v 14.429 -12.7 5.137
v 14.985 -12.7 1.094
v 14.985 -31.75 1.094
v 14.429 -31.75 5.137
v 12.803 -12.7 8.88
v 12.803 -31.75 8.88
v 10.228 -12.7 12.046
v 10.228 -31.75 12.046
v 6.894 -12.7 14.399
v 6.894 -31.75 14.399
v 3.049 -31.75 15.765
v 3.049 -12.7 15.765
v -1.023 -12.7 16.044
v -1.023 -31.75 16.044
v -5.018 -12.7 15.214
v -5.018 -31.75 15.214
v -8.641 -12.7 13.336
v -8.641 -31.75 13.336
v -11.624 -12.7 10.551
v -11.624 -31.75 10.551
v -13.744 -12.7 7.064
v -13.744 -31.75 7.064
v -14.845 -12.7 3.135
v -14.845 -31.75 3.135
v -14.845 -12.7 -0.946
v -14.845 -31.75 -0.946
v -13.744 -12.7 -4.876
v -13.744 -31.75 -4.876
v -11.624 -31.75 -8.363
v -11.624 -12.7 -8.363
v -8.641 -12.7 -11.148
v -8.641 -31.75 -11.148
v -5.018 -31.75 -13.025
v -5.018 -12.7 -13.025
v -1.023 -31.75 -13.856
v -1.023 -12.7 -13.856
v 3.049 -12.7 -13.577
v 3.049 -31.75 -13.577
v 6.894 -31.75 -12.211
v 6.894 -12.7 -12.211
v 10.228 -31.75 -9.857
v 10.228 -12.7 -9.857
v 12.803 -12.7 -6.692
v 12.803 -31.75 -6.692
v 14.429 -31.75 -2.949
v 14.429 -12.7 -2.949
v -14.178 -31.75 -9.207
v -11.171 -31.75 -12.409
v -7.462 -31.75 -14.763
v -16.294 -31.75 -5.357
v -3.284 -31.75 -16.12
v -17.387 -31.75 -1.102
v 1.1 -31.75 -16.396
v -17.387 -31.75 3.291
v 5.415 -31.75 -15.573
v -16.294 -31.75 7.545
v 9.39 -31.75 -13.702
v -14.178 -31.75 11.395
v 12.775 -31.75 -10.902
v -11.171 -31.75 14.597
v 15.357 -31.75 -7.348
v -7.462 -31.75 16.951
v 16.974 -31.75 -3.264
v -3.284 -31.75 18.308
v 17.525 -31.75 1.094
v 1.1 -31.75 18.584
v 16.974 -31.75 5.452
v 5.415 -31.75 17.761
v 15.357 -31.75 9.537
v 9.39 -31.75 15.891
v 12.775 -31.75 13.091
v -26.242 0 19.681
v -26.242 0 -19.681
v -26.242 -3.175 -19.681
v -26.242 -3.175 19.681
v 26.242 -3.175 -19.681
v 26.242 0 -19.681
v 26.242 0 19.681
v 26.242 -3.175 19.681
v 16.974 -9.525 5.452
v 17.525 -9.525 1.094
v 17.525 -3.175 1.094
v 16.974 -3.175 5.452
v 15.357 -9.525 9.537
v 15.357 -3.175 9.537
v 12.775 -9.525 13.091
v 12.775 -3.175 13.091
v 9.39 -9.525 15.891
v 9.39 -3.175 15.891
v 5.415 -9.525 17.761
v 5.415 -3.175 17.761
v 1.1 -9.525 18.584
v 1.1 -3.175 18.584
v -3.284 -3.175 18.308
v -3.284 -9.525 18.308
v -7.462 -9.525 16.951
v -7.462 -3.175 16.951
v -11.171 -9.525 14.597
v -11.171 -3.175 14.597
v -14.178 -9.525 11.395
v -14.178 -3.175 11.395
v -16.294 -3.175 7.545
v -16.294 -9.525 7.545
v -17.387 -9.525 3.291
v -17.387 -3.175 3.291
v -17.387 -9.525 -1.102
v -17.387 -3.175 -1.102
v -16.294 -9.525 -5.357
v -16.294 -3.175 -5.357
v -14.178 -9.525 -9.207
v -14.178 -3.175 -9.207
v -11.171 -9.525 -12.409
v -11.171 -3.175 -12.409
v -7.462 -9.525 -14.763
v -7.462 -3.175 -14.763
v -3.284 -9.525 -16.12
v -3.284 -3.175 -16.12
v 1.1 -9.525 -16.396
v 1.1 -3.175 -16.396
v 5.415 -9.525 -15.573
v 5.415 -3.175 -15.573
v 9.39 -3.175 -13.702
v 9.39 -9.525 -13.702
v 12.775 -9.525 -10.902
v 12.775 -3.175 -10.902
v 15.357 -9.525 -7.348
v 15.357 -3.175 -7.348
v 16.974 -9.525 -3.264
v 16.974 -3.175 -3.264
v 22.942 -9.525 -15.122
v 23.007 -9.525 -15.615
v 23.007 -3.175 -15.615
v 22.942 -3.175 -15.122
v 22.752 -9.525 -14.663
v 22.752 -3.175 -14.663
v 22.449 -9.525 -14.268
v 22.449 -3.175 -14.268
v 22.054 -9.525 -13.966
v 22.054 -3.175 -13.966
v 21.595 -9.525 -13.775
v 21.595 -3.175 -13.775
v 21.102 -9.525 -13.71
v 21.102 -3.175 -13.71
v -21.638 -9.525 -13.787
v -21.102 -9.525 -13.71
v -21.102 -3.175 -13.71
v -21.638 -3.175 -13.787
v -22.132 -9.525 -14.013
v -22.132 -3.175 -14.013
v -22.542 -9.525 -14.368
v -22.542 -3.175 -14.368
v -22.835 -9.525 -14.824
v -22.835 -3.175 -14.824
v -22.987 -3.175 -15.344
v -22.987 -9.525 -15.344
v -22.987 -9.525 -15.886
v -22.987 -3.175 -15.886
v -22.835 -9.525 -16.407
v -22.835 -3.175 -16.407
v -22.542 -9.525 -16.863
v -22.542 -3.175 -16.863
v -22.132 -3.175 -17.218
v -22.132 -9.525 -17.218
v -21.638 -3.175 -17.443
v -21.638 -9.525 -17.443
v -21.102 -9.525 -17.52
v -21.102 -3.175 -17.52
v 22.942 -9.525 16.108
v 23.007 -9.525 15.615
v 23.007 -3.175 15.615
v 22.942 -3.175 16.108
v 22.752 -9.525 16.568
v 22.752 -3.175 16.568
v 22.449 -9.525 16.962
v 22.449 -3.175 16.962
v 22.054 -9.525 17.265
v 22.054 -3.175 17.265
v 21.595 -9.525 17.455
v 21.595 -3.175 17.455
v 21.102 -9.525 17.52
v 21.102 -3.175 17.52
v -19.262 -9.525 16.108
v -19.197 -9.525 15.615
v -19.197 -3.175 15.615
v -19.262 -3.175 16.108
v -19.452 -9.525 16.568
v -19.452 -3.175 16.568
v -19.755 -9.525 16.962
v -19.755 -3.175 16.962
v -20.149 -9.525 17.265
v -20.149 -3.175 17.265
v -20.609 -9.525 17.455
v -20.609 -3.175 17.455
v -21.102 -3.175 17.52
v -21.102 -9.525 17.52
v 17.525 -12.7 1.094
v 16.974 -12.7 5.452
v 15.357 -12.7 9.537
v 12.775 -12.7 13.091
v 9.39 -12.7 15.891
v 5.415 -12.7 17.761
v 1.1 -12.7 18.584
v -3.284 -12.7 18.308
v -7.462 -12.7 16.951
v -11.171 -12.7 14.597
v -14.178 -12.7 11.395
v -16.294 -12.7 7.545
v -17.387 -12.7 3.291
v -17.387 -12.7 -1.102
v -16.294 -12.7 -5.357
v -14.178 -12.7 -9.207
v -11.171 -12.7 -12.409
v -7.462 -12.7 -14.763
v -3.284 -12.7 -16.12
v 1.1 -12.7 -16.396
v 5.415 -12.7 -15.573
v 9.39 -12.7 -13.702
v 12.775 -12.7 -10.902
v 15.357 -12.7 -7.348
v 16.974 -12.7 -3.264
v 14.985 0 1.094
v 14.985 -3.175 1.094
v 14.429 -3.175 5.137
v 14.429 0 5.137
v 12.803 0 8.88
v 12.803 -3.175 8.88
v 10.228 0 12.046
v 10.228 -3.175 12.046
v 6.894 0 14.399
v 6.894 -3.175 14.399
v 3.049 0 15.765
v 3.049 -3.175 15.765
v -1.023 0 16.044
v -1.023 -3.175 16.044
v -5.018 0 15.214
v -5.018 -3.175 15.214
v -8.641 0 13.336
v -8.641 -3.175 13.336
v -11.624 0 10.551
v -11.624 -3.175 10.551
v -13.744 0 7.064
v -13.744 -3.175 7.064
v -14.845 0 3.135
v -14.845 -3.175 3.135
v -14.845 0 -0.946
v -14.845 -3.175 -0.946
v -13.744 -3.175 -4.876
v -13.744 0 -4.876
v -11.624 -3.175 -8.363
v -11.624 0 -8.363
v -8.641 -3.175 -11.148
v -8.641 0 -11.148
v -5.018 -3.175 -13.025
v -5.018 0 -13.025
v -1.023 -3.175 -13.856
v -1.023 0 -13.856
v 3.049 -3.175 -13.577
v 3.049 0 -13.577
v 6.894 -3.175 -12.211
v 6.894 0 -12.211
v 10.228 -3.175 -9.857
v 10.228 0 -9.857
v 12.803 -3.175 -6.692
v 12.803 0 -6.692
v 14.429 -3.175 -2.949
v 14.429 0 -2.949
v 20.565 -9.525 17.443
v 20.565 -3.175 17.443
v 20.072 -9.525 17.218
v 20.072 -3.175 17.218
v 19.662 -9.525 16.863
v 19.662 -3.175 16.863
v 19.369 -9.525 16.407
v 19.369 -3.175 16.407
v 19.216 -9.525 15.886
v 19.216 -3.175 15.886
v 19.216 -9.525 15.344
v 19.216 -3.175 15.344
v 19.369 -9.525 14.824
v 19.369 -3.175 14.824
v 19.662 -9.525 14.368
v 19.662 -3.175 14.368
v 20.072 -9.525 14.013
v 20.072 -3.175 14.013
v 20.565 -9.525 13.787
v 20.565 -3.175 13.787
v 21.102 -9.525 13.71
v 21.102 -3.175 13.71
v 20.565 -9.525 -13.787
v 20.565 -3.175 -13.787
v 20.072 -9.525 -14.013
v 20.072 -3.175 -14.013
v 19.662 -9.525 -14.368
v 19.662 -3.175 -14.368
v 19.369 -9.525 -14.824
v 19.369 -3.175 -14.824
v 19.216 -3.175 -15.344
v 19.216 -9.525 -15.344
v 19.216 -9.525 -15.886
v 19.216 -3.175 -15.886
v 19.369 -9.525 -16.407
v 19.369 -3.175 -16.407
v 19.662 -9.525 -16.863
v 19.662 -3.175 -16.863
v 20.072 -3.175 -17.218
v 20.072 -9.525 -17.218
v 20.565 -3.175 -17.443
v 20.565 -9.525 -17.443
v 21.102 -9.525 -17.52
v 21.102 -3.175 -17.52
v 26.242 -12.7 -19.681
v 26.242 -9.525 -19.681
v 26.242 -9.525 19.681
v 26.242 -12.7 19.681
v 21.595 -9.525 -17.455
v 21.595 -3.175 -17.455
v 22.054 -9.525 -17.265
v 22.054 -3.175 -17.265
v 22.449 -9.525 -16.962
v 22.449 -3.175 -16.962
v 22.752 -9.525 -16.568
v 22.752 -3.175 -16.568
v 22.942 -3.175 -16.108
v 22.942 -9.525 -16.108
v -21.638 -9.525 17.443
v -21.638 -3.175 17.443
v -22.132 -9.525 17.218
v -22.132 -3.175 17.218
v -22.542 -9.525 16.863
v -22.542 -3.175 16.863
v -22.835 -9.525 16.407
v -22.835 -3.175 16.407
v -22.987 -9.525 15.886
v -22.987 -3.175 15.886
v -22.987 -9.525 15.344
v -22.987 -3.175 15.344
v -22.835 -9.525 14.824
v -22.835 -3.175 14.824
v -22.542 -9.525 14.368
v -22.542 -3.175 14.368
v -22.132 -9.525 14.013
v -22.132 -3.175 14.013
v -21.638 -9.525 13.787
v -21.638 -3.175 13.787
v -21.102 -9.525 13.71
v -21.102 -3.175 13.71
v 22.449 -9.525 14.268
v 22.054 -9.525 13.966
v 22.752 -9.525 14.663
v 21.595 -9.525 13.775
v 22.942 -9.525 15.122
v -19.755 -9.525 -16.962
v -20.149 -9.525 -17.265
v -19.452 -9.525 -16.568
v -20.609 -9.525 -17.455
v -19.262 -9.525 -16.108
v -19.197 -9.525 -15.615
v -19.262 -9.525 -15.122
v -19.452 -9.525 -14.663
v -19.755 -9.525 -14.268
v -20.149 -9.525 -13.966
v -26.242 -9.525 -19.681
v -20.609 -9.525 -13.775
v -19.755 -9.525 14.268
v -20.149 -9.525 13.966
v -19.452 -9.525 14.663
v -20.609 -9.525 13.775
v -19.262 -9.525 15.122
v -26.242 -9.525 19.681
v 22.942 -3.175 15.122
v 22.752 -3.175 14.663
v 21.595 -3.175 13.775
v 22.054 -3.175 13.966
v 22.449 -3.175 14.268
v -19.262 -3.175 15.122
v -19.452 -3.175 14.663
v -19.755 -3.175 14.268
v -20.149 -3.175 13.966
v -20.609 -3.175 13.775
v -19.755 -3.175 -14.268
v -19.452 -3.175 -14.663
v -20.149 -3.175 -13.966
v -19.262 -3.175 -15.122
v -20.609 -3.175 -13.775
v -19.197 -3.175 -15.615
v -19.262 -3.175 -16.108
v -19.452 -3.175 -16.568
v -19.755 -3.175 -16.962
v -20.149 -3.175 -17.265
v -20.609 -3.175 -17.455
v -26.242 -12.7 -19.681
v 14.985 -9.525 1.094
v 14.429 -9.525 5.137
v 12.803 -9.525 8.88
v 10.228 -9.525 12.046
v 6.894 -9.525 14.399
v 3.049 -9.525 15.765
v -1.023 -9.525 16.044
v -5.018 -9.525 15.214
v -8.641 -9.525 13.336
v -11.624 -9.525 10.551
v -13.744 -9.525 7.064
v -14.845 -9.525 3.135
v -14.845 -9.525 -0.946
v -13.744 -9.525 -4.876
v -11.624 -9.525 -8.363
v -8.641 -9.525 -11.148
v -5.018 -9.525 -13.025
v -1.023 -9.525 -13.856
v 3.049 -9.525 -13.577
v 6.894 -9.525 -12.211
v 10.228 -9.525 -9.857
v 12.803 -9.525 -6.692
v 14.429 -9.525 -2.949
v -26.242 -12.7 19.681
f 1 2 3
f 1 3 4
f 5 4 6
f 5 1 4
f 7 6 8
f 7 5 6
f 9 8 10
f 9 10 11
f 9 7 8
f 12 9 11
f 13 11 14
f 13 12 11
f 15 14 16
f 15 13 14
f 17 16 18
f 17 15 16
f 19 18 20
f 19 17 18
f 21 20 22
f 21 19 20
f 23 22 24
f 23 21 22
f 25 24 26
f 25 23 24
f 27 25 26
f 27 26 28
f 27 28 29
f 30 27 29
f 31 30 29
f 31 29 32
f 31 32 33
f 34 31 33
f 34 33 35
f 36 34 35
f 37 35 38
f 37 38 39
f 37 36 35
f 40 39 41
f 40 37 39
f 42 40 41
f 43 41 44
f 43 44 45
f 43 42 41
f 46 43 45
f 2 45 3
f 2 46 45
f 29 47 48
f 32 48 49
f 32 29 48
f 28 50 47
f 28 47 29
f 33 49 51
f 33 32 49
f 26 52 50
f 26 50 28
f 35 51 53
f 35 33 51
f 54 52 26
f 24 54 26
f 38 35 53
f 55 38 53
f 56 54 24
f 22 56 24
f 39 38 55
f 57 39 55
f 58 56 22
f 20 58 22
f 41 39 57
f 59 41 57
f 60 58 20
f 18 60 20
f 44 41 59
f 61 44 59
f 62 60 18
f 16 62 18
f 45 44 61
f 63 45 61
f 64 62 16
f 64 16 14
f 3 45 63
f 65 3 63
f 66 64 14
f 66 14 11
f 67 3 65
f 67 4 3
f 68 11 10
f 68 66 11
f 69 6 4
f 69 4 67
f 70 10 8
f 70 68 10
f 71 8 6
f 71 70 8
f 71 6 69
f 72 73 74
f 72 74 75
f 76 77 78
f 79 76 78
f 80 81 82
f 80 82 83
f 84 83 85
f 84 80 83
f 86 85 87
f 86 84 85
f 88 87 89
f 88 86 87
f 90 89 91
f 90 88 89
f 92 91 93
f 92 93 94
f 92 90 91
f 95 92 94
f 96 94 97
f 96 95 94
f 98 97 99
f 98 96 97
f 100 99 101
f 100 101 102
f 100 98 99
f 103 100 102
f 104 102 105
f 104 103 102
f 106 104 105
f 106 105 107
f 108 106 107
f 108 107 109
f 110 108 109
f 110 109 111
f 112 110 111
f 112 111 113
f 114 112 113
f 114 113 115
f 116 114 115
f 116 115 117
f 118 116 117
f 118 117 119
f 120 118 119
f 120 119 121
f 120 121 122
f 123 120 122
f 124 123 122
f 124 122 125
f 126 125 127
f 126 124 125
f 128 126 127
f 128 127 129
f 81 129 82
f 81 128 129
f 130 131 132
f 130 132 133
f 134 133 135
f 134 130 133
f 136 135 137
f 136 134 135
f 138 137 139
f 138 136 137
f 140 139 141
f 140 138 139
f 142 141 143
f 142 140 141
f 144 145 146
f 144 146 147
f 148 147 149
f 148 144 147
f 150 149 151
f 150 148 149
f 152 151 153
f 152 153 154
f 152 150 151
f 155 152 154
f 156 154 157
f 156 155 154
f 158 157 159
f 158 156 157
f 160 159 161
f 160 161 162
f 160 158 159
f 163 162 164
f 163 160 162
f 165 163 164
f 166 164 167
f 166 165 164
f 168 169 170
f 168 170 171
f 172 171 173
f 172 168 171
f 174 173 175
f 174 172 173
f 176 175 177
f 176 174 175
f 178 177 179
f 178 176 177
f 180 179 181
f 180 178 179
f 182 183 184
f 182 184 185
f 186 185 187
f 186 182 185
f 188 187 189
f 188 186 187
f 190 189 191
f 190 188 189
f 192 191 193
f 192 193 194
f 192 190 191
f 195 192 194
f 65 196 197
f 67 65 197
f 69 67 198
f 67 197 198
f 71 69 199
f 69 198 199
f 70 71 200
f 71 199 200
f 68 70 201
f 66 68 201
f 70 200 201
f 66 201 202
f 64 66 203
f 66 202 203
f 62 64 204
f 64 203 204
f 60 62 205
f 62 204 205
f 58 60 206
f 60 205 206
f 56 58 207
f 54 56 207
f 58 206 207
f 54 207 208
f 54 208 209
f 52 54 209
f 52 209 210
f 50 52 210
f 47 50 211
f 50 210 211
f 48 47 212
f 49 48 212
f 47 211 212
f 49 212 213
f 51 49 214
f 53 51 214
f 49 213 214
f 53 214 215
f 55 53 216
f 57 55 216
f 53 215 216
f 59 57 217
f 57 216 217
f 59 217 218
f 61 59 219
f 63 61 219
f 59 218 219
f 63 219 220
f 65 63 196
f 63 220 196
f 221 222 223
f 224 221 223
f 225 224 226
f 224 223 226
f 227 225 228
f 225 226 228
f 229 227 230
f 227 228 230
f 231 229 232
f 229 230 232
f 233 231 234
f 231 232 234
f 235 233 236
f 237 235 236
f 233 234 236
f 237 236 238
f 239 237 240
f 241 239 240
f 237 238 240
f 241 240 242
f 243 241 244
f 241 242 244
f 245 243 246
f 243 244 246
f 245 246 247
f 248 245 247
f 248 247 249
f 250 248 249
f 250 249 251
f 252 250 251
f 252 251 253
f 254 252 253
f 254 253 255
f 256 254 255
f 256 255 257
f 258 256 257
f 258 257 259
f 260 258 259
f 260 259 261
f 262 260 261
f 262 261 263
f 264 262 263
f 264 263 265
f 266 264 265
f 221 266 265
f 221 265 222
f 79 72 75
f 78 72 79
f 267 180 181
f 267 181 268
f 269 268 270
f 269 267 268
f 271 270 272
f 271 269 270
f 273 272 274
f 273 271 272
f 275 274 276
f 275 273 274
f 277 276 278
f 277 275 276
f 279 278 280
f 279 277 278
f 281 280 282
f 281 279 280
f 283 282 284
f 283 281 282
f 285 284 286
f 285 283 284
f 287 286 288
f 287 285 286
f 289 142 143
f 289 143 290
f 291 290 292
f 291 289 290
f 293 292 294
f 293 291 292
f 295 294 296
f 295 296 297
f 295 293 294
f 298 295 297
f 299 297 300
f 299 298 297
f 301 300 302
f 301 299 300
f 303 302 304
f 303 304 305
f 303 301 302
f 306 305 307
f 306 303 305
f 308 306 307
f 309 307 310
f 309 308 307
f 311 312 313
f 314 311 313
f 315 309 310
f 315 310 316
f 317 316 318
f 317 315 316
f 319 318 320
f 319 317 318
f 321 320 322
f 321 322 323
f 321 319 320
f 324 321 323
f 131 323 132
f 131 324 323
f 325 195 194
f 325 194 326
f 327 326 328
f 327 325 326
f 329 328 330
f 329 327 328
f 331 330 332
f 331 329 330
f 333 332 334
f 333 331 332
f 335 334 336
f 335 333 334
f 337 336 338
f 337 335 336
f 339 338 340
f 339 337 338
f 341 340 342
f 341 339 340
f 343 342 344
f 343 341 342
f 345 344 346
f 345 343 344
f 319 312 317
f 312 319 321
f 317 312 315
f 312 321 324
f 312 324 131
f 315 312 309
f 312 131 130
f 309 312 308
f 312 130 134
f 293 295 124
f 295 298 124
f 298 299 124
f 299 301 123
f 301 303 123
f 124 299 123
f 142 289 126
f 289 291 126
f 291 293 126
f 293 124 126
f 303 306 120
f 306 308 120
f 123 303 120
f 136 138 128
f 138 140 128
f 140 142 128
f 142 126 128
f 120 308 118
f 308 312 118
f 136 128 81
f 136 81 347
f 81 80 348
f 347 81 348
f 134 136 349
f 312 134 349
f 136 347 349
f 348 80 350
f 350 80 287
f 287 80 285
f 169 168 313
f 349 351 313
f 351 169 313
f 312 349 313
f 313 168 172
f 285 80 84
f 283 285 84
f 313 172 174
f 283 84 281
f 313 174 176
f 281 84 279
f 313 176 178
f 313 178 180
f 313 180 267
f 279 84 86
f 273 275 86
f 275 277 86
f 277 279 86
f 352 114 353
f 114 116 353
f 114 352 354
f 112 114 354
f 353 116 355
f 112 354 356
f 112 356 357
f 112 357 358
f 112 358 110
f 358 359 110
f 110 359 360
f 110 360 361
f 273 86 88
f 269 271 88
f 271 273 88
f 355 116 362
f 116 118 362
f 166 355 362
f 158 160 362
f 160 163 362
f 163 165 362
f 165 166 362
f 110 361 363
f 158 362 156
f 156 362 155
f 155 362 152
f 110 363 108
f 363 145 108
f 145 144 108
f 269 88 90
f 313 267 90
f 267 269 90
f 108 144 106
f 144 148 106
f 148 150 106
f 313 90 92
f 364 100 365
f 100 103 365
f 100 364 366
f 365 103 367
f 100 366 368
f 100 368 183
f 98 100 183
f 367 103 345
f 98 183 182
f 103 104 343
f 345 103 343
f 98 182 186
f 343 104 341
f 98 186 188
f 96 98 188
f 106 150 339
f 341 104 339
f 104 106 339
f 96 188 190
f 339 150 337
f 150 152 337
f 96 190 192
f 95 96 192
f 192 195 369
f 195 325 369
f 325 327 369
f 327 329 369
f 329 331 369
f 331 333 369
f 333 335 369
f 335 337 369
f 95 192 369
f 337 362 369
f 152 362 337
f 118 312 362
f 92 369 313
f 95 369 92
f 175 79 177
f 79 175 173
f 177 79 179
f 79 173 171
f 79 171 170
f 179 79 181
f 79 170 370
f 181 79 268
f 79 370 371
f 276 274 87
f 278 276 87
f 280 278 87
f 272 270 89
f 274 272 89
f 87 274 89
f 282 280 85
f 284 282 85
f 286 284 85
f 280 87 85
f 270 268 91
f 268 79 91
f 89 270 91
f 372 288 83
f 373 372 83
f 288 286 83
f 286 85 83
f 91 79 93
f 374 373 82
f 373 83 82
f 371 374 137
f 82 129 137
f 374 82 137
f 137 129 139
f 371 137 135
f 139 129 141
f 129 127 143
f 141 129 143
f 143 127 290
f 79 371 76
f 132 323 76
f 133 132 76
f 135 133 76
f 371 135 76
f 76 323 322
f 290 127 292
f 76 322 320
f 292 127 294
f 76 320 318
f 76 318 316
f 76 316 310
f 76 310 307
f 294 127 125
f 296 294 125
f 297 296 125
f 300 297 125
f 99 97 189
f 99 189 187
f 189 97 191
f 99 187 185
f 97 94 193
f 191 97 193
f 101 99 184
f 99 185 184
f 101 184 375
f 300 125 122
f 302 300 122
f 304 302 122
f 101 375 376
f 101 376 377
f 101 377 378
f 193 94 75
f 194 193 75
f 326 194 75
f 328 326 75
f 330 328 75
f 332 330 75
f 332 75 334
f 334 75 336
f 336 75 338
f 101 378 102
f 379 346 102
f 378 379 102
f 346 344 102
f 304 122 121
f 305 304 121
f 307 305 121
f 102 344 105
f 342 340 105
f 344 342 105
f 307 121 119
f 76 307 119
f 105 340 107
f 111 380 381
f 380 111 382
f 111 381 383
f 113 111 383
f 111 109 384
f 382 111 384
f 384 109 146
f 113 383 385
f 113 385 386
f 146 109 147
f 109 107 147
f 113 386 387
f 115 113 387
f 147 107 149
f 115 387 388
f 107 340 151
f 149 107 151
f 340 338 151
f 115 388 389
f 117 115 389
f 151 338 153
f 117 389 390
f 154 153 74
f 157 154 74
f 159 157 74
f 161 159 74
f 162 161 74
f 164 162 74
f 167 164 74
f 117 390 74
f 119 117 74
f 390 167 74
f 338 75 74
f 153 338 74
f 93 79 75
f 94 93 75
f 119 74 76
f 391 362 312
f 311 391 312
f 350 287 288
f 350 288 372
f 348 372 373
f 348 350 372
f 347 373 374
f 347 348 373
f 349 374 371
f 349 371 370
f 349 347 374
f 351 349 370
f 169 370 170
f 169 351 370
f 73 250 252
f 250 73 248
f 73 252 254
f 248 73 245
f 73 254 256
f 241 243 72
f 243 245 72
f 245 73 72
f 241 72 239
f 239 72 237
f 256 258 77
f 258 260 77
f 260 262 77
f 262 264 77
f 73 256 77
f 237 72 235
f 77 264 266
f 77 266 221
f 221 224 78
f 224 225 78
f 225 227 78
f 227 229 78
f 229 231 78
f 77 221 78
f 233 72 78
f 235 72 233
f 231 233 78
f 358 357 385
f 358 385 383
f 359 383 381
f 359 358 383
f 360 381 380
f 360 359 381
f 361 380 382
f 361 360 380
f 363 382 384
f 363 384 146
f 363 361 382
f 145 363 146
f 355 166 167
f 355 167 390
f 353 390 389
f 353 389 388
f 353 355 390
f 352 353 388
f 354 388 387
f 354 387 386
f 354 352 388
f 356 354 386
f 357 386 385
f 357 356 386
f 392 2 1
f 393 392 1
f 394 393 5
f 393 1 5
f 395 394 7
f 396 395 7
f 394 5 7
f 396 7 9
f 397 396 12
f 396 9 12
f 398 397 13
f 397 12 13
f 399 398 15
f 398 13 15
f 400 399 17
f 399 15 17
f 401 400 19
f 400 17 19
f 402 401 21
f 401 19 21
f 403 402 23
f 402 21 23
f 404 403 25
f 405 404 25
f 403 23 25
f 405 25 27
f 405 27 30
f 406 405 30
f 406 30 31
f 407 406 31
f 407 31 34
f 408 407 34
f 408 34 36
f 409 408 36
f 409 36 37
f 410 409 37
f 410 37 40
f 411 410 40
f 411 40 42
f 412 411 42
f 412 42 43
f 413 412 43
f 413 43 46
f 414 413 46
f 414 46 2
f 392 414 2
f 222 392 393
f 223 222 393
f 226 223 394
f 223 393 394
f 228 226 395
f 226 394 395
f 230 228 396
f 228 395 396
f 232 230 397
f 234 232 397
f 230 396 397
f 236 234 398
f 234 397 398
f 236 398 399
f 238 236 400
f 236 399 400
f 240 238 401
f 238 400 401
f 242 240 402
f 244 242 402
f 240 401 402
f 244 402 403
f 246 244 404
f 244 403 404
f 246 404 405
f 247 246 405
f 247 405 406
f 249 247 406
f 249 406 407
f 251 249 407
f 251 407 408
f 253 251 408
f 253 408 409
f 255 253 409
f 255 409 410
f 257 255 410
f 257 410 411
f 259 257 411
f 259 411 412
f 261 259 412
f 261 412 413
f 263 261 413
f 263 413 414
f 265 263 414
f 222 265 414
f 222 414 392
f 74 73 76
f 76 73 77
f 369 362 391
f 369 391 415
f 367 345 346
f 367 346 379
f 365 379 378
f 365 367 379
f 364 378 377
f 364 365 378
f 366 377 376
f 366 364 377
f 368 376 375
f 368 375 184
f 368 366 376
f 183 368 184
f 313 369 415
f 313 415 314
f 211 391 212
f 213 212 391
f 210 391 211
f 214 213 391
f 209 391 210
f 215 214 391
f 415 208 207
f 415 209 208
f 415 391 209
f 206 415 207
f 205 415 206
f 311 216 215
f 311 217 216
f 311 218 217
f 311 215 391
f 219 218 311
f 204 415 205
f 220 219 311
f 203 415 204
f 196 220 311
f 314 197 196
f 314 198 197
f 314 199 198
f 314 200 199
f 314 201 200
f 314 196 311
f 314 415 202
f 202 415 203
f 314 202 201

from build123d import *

# Parameters (mm, degrees)
F0_W     = 52.483174
F0_H     = 39.362366
F1_DEPTH = 12.7
F3_DEPTH = 52.484174
F4_R     = 17.52473
F4_R_2   = 14.98473
F5_DEPTH = 12.7
F6_DEPTH = 19.05
F7_DEPTH = 25.4


with BuildPart() as f1:
    # F0 (on Front) → F1 (new body)
    with BuildSketch(Plane.XZ):
        Rectangle(F0_W, F0_H)
    extrude(amount=F1_DEPTH)

    # F2 (on face) → F3 (cut, through all)
    with BuildSketch(Plane(origin=(-26.241587, 0, 0), x_dir=(0, -1, 0), z_dir=(-1, 0, 0))):
        Polygon((6.35, 19.681183), (3.175, 19.681183), (3.175, -19.681183), (6.35, -19.681183), (9.525, -19.681183), (9.525, 19.681183), align=None)
    extrude(amount=-F3_DEPTH, mode=Mode.SUBTRACT)

    # F4 (on face) → F5 (join)
    with BuildSketch(Plane.XZ.offset(12.7)):
        with BuildLine():
            ThreePointArc((-19.196799, 15.615331), (-19.75476, 16.962369), (-21.101799, 17.520331))
            Line((-21.101799, 17.520331), (-21.101799, 15.615331))
            Line((-21.101799, 15.615331), (-21.101799, 13.710331))
            ThreePointArc((-21.101799, 13.710331), (-19.75476, 14.268293), (-19.196799, 15.615331))
        make_face()
        with BuildLine():
            ThreePointArc((-19.196799, -15.615332), (-19.75476, -14.268294), (-21.101799, -13.710332))
            Line((-21.101799, -13.710332), (-21.101799, -15.615332))
            Line((-21.101799, -15.615332), (-21.101799, -17.520332))
            ThreePointArc((-21.101799, -17.520332), (-19.75476, -16.96237), (-19.196799, -15.615332))
        make_face()
        with BuildLine():
            Line((-21.101799, -15.615332), (-21.101799, -13.710332))
            ThreePointArc((-21.101799, -13.710332), (-23.006799, -15.615332), (-21.101799, -17.520332))
            Line((-21.101799, -17.520332), (-21.101799, -15.615332))
        make_face()
        with BuildLine():
            Line((-21.101799, 15.615331), (-21.101799, 17.520331))
            ThreePointArc((-21.101799, 17.520331), (-23.006799, 15.615331), (-21.101799, 13.710331))
            Line((-21.101799, 13.710331), (-21.101799, 15.615331))
        make_face()
        with BuildLine():
            ThreePointArc((23.006799, 15.615331), (22.448837, 16.962369), (21.101799, 17.520331))
            Line((21.101799, 17.520331), (21.101799, 15.615331))
            Line((21.101799, 15.615331), (21.101799, 13.710331))
            ThreePointArc((21.101799, 13.710331), (22.448837, 14.268293), (23.006799, 15.615331))
        make_face()
        with BuildLine():
            ThreePointArc((23.006799, -15.615332), (22.448837, -14.268294), (21.101799, -13.710332))
            Line((21.101799, -13.710332), (21.101799, -15.615332))
            Line((21.101799, -15.615332), (21.101799, -17.520332))
            ThreePointArc((21.101799, -17.520332), (22.448837, -16.96237), (23.006799, -15.615332))
        make_face()
        with BuildLine():
            Line((21.101799, -15.615332), (21.101799, -13.710332))
            ThreePointArc((21.101799, -13.710332), (19.196799, -15.615332), (21.101799, -17.520332))
            Line((21.101799, -17.520332), (21.101799, -15.615332))
        make_face()
        with BuildLine():
            Line((21.101799, 15.615331), (21.101799, 17.520331))
            ThreePointArc((21.101799, 17.520331), (19.196799, 15.615331), (21.101799, 13.710331))
            Line((21.101799, 13.710331), (21.101799, 15.615331))
        make_face()
        with Locations((0, 1.094137)):
            Circle(F4_R)
        with Locations((0, 1.094137)):
            Circle(F4_R_2, mode=Mode.SUBTRACT)
    extrude(amount=-F5_DEPTH)

    # F4 (on face) → F6 (join)
    with BuildSketch(Plane.XZ.offset(12.7)):
        with Locations((0, 1.094137)):
            Circle(F4_R)
        with Locations((0, 1.094137)):
            Circle(F4_R_2, mode=Mode.SUBTRACT)
    extrude(amount=F6_DEPTH)

    # F4 (on face) → F7 (cut)
    with BuildSketch(Plane.XZ.offset(12.7)):
        with Locations((0, 1.094137)):
            Circle(F4_R_2)
    extrude(amount=-F7_DEPTH, mode=Mode.SUBTRACT)


solid = f1.part
